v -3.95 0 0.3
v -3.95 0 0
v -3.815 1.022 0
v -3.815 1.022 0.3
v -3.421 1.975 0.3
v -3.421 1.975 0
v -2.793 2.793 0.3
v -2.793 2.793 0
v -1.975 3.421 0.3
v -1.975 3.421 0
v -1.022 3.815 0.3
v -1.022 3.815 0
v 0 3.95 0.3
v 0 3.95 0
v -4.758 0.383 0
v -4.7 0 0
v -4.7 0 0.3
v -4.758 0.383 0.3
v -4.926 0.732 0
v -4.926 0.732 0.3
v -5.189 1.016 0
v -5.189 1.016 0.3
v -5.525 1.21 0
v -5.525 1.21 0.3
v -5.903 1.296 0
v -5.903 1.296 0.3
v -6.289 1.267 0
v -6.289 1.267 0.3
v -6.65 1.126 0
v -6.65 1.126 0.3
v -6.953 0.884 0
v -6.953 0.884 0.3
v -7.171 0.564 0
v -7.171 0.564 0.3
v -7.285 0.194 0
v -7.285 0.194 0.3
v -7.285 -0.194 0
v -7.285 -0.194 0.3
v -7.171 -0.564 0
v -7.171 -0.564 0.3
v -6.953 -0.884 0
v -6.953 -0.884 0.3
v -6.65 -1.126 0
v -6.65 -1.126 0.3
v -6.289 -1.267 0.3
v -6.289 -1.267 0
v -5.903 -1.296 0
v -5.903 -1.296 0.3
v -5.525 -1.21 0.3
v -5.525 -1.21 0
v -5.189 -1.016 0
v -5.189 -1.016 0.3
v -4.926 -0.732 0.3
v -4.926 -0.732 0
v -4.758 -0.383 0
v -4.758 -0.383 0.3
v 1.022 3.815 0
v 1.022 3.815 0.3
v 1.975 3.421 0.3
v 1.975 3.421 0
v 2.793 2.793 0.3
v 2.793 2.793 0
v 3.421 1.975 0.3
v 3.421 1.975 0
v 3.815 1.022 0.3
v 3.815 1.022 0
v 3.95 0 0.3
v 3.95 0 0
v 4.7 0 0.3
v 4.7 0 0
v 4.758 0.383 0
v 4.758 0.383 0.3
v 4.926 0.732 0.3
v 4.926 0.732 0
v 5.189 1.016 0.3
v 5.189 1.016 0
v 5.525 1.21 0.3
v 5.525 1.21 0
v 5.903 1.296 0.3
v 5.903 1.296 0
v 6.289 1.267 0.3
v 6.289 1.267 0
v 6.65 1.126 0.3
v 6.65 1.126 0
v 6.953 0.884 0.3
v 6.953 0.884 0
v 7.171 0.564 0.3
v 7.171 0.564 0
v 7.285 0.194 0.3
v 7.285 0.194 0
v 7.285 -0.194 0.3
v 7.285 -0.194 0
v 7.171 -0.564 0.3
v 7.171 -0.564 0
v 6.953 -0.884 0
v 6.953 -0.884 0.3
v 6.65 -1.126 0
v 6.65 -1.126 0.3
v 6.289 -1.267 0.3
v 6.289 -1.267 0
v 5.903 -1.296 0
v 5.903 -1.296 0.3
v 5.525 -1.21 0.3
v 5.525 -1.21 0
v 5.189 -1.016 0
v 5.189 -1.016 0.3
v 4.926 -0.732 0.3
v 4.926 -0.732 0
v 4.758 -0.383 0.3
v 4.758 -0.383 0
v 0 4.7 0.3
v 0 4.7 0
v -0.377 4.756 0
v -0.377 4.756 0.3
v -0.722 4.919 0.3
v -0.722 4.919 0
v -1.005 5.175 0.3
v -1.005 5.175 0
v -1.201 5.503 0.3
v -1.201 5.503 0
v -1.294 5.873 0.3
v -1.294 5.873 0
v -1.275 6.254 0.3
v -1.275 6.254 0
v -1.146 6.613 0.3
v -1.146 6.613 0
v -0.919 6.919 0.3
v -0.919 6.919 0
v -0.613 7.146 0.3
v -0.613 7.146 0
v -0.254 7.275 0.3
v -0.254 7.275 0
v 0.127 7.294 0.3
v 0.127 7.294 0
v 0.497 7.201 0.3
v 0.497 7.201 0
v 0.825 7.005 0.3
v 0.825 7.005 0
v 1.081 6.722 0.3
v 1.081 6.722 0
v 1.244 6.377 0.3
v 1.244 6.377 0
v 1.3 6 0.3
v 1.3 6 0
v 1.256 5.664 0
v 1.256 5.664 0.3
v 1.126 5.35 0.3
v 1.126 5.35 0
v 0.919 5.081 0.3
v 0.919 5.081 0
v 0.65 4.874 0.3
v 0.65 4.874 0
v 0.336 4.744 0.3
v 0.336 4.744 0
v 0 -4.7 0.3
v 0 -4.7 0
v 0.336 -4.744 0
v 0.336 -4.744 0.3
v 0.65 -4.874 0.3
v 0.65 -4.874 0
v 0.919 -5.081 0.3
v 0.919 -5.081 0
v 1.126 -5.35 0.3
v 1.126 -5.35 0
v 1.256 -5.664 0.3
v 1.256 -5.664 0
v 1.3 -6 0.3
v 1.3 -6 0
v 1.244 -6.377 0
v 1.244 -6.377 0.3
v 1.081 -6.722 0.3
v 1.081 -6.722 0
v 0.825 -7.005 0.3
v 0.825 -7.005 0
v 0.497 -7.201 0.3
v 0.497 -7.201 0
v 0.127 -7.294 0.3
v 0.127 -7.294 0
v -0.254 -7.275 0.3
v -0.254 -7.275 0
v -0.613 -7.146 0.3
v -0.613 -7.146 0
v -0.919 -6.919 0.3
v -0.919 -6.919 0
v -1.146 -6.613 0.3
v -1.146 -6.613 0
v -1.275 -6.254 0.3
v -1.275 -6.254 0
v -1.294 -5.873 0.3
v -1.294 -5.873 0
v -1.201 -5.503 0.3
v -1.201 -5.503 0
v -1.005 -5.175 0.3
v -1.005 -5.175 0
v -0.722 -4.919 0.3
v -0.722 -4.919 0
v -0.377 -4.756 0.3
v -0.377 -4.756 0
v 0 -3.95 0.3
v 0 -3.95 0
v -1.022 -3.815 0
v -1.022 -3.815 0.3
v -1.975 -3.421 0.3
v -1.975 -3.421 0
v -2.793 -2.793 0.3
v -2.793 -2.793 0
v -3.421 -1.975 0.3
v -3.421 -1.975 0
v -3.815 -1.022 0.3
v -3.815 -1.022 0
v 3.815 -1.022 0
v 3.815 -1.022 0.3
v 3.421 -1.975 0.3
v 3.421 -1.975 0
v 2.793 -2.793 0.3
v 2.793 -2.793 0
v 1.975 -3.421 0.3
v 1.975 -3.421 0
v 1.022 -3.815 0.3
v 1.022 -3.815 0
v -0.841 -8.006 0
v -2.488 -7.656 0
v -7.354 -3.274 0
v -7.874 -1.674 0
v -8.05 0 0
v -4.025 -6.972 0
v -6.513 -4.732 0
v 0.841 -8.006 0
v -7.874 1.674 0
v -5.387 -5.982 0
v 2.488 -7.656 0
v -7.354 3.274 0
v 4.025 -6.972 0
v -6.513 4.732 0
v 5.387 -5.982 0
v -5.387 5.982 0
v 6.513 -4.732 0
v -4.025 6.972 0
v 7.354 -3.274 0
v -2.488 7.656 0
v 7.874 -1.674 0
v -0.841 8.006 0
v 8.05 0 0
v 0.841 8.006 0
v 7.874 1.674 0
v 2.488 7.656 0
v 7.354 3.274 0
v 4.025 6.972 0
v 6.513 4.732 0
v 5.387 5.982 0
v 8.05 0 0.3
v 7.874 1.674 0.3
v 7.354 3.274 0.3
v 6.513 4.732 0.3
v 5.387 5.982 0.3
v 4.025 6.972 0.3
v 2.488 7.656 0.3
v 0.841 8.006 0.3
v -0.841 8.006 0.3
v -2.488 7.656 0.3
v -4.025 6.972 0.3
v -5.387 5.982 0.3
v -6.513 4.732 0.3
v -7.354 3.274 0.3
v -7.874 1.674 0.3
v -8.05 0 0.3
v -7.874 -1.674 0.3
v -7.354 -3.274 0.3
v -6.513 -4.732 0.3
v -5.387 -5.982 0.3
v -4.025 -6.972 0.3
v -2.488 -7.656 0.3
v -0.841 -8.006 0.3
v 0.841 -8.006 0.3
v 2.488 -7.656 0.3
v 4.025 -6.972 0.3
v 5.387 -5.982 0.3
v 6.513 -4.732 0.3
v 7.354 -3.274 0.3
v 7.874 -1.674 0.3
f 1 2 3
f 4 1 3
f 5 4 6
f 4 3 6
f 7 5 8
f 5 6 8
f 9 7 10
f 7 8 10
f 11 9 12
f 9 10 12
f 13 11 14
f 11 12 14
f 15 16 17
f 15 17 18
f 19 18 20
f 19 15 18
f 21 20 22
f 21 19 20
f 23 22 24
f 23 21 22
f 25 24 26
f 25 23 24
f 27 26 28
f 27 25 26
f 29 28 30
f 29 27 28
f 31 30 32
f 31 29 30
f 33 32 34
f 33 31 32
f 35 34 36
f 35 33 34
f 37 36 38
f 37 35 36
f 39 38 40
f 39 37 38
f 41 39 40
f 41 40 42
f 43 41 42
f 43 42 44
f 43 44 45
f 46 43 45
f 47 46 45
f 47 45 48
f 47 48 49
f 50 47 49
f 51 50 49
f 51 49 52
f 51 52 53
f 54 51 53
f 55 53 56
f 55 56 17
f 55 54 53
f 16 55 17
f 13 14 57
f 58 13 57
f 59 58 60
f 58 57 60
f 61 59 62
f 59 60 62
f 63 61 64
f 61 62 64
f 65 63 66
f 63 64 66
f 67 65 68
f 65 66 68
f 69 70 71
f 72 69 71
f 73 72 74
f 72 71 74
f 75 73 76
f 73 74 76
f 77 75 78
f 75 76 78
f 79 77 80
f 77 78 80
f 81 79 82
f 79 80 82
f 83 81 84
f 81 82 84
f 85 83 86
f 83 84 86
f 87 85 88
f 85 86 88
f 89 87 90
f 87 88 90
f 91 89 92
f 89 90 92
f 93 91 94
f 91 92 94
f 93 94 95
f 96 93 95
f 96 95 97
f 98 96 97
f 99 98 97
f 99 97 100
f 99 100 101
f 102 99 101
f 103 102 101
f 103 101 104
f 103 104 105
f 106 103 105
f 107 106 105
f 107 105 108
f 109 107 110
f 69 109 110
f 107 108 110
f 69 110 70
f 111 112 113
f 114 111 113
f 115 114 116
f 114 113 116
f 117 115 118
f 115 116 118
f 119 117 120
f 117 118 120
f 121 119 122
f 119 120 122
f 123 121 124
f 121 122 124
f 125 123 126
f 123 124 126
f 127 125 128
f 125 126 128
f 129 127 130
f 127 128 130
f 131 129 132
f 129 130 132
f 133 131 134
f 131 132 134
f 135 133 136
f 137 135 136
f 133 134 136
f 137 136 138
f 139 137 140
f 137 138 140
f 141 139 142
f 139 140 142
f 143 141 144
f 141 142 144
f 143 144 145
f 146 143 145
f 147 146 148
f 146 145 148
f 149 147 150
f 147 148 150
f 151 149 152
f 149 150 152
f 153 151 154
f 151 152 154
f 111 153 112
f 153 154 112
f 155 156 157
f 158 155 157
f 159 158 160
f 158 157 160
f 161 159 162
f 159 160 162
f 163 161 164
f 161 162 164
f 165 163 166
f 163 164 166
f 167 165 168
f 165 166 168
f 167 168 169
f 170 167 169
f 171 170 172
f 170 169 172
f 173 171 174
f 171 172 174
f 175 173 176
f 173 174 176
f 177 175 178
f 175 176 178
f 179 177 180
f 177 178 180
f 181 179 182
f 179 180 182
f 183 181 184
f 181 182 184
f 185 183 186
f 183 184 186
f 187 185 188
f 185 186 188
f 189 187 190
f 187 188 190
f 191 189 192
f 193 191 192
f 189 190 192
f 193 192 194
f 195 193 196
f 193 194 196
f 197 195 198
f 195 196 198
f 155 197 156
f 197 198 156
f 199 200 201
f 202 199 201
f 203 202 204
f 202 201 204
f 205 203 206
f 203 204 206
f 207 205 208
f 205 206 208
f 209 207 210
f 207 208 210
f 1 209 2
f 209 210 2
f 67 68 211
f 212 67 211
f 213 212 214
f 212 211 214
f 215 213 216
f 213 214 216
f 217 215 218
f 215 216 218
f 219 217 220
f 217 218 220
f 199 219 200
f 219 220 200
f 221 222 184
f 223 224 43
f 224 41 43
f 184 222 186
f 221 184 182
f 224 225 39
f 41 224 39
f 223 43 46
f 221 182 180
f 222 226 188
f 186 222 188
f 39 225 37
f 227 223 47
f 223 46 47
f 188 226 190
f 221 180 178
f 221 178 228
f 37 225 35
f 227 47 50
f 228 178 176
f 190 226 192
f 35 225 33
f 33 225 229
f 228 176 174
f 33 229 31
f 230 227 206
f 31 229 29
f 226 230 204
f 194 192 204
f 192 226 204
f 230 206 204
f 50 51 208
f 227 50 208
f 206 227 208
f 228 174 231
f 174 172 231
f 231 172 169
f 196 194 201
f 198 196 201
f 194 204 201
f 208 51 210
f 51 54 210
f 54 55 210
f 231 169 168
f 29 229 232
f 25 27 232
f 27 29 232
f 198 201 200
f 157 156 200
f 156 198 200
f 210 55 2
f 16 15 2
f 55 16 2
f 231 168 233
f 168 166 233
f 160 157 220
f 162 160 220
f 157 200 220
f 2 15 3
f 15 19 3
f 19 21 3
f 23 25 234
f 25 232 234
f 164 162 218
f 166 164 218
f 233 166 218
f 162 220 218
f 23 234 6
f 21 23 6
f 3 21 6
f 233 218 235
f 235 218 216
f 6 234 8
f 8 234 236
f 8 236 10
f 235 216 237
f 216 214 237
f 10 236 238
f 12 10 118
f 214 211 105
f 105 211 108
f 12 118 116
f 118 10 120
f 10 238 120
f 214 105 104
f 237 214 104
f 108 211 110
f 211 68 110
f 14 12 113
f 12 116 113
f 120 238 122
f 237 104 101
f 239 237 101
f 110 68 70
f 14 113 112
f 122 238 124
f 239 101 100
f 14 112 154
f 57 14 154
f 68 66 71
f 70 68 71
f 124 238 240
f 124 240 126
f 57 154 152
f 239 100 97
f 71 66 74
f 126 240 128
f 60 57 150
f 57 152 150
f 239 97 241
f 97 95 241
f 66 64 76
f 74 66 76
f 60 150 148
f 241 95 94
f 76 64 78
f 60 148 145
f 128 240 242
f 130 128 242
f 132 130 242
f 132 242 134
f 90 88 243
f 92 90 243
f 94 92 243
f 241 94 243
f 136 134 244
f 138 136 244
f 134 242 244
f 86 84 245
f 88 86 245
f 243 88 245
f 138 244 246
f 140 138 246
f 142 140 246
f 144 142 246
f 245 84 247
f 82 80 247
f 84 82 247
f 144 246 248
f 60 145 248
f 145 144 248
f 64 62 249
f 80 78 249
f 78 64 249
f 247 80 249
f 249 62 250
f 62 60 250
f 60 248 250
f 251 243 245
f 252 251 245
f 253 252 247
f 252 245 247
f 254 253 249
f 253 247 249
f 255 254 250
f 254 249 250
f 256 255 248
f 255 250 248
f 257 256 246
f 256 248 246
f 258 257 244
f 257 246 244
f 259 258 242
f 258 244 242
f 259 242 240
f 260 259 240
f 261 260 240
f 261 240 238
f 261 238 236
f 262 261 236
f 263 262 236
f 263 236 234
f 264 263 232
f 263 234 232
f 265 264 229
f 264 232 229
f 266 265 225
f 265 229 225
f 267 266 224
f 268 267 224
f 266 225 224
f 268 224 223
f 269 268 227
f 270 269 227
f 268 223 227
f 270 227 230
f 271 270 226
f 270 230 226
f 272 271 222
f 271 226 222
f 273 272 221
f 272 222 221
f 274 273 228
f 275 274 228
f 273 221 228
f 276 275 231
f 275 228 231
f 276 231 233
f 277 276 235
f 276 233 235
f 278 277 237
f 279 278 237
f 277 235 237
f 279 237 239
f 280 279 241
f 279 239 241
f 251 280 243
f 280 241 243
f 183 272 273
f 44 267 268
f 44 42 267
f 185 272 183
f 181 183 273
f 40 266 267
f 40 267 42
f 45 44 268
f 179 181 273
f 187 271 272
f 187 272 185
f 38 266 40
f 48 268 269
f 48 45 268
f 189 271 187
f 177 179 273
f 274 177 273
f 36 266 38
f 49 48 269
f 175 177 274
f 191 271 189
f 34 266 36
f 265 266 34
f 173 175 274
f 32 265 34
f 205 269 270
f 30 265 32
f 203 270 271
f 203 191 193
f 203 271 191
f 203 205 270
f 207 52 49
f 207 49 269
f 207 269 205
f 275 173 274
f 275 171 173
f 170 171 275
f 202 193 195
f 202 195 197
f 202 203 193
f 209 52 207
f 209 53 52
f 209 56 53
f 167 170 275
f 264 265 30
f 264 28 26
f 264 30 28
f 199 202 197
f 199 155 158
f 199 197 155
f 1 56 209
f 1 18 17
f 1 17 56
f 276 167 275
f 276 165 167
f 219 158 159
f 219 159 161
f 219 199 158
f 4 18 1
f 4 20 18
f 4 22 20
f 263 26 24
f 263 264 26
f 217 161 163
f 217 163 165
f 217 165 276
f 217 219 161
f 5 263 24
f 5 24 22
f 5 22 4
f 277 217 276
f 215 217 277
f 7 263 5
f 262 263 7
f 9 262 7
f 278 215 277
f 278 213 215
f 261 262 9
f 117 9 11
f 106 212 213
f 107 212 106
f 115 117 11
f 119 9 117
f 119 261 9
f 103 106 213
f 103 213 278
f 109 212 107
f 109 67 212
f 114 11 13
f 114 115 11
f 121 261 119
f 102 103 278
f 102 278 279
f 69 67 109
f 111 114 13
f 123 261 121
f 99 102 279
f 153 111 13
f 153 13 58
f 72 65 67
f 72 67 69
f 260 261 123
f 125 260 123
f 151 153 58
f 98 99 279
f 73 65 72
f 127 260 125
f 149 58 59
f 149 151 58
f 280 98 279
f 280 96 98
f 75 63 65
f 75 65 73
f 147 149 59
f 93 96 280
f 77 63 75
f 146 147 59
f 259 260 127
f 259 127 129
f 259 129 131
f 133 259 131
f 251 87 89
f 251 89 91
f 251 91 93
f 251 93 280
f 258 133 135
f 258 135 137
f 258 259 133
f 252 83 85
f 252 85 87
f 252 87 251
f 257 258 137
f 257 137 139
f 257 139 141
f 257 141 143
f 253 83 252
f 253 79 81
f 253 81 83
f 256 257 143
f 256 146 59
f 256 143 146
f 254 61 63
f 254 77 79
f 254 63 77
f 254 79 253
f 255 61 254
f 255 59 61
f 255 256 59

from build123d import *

# Parameters (mm, degrees)
F0_R     = 8.05
F0_R_2   = 1.3
F1_DEPTH = 0.3


with BuildPart() as f1:
    # F0 (on Top) → F1 (new body)
    with BuildSketch(Plane.XY):
        Circle(F0_R)
        with BuildLine():
            ThreePointArc((1.3, -6), (-0.919239, -6.919239), (0, -4.7))
            ThreePointArc((0, -4.7), (0.919239, -5.080761), (1.3, -6))
        make_face(mode=Mode.SUBTRACT)
        with Locations((-6, 0)):
            Circle(F0_R_2, mode=Mode.SUBTRACT)
        with BuildLine():
            ThreePointArc((0, -3.95), (-2.793072, -2.793072), (-3.95, 0))
            ThreePointArc((-3.95, 0), (-2.793072, 2.793072), (0, 3.95))
            ThreePointArc((0, 3.95), (2.793072, 2.793072), (3.95, 0))
            ThreePointArc((3.95, 0), (2.793072, -2.793072), (0, -3.95))
        make_face(mode=Mode.SUBTRACT)
        with BuildLine():
            ThreePointArc((7.3, 0), (6, -1.3), (4.7, 0))
            ThreePointArc((4.7, 0), (6, 1.3), (7.3, 0))
        make_face(mode=Mode.SUBTRACT)
        with BuildLine():
            ThreePointArc((1.3, 6), (0.919239, 5.080761), (0, 4.7))
            ThreePointArc((0, 4.7), (-0.919239, 6.919239), (1.3, 6))
        make_face(mode=Mode.SUBTRACT)
    extrude(amount=F1_DEPTH)


solid = f1.part
